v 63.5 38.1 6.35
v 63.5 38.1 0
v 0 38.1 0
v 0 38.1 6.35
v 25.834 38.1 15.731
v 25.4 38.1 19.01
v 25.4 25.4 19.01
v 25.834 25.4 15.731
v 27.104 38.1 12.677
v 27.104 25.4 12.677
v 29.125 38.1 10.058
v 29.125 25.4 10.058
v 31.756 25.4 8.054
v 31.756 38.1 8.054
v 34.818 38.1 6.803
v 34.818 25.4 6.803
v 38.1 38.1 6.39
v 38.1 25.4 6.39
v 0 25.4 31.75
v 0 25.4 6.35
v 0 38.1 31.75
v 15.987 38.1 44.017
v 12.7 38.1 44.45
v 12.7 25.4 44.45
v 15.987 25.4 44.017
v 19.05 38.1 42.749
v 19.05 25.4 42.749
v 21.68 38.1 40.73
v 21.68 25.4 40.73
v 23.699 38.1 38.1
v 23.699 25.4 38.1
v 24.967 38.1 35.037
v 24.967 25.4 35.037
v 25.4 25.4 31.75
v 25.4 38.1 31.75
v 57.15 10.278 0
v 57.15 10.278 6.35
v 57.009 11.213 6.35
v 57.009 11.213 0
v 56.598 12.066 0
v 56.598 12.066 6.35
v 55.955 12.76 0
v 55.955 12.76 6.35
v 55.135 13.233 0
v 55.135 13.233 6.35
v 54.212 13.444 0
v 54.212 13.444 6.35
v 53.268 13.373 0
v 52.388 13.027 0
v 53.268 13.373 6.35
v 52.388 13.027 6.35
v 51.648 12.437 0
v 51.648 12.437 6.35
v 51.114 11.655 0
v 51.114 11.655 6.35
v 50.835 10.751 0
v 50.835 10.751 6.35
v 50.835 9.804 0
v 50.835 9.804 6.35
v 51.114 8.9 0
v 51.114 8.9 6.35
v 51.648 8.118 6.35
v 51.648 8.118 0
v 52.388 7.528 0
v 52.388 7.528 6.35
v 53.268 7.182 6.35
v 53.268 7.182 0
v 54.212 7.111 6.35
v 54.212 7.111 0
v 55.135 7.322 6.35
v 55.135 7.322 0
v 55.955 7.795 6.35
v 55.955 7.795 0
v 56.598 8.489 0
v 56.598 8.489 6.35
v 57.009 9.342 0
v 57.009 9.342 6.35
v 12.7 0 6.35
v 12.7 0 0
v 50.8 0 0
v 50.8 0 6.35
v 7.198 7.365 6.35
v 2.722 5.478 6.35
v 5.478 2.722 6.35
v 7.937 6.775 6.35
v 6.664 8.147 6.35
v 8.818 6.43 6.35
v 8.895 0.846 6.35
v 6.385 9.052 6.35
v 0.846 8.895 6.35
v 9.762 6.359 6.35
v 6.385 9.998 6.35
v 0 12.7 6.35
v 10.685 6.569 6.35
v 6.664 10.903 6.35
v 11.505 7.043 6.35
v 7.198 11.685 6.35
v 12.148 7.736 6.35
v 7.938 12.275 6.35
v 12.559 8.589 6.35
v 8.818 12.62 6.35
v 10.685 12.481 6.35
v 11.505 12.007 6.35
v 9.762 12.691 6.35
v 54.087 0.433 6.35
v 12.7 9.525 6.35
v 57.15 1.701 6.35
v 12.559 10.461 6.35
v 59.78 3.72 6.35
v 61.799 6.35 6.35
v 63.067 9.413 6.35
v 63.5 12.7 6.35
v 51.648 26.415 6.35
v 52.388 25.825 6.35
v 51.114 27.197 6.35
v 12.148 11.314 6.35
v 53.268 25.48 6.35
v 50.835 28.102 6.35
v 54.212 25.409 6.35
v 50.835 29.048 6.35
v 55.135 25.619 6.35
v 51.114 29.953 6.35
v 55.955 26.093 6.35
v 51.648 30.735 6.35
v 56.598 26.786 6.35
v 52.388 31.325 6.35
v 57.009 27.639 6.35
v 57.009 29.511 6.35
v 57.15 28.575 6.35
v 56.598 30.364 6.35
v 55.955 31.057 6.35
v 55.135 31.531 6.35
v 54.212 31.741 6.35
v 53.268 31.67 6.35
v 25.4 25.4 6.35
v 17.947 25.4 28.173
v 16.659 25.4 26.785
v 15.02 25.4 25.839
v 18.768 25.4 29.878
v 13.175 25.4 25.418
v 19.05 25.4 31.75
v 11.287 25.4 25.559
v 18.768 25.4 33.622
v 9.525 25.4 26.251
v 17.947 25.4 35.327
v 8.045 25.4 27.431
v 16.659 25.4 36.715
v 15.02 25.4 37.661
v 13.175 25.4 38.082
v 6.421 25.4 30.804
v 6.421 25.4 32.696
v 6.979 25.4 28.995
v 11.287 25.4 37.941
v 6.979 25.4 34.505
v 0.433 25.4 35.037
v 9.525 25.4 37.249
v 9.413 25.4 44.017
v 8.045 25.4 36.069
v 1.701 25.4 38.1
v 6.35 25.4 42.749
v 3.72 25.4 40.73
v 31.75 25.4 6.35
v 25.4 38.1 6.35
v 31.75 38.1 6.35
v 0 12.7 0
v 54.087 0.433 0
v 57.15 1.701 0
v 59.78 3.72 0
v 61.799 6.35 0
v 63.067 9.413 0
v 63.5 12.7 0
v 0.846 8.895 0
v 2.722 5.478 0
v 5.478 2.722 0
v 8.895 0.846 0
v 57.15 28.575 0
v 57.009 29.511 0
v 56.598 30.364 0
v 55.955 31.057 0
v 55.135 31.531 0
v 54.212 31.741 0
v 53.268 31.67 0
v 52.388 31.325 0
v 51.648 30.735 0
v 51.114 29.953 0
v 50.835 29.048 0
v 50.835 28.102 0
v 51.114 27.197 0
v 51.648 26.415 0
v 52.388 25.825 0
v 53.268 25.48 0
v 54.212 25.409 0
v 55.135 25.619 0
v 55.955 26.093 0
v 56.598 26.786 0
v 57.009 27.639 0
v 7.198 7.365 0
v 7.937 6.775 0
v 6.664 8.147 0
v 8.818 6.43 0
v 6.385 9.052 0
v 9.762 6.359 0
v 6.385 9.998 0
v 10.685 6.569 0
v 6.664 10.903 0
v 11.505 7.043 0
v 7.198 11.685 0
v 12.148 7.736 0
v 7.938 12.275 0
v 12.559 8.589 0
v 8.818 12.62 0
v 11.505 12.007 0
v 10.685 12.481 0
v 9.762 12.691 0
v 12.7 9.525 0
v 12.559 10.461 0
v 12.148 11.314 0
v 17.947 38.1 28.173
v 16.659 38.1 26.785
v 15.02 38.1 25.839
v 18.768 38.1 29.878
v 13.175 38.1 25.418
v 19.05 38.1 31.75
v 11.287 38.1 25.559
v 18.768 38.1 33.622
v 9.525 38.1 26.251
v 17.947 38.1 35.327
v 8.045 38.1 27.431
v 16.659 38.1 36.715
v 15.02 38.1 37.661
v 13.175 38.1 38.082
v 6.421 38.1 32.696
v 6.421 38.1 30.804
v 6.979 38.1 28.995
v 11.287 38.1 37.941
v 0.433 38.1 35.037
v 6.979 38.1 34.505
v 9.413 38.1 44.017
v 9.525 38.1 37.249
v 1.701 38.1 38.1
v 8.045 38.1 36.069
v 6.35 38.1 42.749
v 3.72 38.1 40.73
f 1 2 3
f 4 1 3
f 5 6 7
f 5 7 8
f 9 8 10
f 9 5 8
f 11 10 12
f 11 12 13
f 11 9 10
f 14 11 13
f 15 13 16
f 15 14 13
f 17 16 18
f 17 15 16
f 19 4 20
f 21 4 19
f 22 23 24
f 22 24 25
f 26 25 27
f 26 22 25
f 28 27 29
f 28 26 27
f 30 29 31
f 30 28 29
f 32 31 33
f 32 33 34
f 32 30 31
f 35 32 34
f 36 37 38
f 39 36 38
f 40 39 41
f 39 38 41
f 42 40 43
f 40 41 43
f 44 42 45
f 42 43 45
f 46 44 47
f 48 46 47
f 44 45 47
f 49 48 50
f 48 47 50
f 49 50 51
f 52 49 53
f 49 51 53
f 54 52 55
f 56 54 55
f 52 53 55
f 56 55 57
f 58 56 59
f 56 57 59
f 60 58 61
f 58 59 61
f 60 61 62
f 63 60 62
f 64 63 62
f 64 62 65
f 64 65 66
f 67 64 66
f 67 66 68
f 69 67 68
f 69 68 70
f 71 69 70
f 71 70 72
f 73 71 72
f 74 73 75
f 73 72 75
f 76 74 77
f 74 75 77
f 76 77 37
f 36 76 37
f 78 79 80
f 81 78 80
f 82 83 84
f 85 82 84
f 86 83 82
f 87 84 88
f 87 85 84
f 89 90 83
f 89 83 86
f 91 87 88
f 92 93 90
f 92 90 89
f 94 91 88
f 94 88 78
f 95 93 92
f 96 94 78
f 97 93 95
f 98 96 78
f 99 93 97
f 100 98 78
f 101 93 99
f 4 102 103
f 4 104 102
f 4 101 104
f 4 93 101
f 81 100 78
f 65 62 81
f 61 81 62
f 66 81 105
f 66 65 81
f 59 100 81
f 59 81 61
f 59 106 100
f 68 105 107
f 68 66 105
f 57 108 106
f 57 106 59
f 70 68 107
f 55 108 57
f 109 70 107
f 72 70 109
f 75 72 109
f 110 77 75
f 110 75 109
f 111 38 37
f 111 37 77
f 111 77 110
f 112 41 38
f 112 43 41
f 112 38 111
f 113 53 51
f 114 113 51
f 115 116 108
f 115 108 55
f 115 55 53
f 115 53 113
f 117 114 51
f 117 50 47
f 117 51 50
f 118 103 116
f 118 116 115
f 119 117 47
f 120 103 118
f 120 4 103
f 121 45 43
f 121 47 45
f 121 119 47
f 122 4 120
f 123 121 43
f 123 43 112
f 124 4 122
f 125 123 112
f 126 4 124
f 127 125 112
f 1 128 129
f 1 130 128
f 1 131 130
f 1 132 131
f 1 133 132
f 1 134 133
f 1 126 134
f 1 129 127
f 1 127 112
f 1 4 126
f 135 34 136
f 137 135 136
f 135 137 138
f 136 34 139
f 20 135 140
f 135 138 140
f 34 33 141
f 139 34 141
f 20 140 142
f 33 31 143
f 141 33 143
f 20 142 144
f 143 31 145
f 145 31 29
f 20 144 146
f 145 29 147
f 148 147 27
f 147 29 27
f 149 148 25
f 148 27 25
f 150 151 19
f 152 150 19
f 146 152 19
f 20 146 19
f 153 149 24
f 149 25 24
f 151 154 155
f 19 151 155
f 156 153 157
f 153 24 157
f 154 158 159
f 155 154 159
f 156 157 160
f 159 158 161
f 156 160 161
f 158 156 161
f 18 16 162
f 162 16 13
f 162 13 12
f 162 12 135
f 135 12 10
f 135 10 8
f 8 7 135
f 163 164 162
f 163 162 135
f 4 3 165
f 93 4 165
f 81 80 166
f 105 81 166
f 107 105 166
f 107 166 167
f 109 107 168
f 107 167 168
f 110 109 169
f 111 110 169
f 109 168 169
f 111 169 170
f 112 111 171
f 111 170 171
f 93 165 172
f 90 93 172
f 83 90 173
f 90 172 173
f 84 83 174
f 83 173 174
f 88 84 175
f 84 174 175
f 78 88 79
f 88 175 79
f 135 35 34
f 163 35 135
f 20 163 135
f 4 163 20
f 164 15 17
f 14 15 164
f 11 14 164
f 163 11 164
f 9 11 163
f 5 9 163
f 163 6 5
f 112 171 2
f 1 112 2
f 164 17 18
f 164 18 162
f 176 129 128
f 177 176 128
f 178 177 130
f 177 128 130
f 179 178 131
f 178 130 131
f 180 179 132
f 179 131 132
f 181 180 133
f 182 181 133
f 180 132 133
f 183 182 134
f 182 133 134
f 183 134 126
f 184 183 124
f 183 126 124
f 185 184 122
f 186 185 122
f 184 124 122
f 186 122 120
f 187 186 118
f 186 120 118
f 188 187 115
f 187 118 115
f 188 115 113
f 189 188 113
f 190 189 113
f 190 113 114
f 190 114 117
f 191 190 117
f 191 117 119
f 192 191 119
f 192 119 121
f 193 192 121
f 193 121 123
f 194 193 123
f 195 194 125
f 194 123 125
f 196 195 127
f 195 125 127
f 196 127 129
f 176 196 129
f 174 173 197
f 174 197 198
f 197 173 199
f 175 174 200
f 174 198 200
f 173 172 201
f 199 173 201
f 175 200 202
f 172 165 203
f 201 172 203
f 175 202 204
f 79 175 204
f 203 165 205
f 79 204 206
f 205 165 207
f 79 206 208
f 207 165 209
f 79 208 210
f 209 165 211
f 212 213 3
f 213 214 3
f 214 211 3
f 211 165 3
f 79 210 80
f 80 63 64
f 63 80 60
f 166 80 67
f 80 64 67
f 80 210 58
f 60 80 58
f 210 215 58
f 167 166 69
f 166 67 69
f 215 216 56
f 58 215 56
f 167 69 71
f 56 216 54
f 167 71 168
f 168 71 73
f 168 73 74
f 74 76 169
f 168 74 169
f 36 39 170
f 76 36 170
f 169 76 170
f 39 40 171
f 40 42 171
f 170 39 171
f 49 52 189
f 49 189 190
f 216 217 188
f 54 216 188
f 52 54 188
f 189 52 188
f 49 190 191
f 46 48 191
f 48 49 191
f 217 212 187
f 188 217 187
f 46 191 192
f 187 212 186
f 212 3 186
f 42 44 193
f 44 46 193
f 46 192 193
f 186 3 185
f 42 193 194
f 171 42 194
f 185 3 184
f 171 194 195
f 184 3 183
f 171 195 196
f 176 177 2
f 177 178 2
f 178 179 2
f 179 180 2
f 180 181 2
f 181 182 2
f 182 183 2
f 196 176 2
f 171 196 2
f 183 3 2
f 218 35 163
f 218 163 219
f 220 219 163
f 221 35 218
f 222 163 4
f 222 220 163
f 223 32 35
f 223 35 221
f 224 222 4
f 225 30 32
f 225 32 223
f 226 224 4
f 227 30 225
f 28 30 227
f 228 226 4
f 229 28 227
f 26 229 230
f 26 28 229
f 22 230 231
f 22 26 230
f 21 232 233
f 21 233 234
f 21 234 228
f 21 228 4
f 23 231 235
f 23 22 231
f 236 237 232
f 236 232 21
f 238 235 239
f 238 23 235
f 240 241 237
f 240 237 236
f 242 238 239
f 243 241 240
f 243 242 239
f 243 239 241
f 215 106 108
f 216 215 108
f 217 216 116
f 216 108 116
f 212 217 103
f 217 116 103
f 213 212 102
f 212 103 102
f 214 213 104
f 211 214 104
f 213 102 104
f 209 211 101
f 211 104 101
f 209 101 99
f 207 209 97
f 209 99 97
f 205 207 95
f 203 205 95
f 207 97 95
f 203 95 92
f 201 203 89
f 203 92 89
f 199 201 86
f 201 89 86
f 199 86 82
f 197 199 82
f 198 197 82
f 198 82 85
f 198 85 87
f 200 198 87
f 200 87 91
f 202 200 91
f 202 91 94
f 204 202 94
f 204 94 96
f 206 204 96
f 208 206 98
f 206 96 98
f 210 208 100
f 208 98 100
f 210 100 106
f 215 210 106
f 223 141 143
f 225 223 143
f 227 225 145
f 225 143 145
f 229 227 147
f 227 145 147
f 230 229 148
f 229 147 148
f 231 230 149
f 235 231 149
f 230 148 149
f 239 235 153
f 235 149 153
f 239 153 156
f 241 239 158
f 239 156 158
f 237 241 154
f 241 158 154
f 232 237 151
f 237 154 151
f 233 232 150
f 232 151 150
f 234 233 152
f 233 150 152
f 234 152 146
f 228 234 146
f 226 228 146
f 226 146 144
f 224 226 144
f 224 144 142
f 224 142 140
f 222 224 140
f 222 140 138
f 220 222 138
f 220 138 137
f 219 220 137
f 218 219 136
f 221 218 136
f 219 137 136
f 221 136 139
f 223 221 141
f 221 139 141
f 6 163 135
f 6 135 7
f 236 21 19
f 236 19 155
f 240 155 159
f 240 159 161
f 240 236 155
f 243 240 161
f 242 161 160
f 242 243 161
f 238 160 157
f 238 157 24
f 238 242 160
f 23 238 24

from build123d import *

# Parameters (mm, degrees)
F1_DEPTH = 6.35
F2_R     = 3.175
F3_DEPTH = 6.35
F6_DEPTH = 12.7
F7_R     = 6.35
F8_DEPTH = 12.7


with BuildPart() as f1:
    # F0 (on Top) → F1 (new body)
    with BuildSketch(Plane.XY):
        with BuildLine():
            Line((63.5, 38.1), (0, 38.1))
            Line((0, 38.1), (0, 12.7))
            ThreePointArc((0, 12.7), (4.0025969694, 4.0025969694), (12.7, 0))
            Line((12.7, 0), (50.8, 0))
            ThreePointArc((50.8, 0), (59.7802561211, 3.7197438789), (63.5, 12.7))
            Line((63.5, 12.7), (63.5, 38.1))
        make_face()
    extrude(amount=F1_DEPTH)

    # F2 (on face) → F3 (cut)
    with BuildSketch(Plane.XY.offset(6.35)):
        with Locations((9.525, 9.525)):
            Circle(F2_R)
        with Locations((53.975, 10.2775470457)):
            Circle(F2_R)
        with Locations((53.975, 28.575)):
            Circle(F2_R)
    extrude(amount=-F3_DEPTH, mode=Mode.SUBTRACT)


with BuildPart() as f6:
    # F5 (on face) → F6 (new body)
    with BuildSketch(Plane(origin=(0, 38.1, 0), x_dir=(-1, 0, 0), z_dir=(0, 1, 0))):
        with BuildLine():
            Line((-31.7500000001, 6.35), (-25.4, 6.35))
            Line((-25.4, 6.35), (-25.4, 19.0102830149))
            ThreePointArc((-25.4, 19.0102830149), (-29.1246641911, 10.058140301), (-38.1, 6.3897169851))
            Line((-38.1, 6.3897169851), (-31.7500000001, 6.35))
        make_face()
    extrude(amount=-F6_DEPTH)


with BuildPart() as f6b:
    # F4 (on face) → F6, piece 2 (new body)
    with BuildSketch(Plane(origin=(0, 38.1, 0), x_dir=(-1, 0, 0), z_dir=(0, 1, 0))):
        with BuildLine():
            Line((-25.4, 6.35), (0, 6.35))
            Line((0, 6.35), (0, 31.75))
            ThreePointArc((0, 31.75), (-3.7197438789, 40.7302561211), (-12.7, 44.45))
            ThreePointArc((-12.7, 44.45), (-21.6802561211, 40.7302561211), (-25.4, 31.75))
            Line((-25.4, 31.75), (-25.4, 6.35))
        make_face()
    extrude(amount=-F6_DEPTH)

    # F7 (on face) → F8 (cut)
    with BuildSketch(Plane.XZ.offset(-25.4)):
        with Locations((12.7, 31.75)):
            Circle(F7_R)
    extrude(amount=-F8_DEPTH, mode=Mode.SUBTRACT)


solid = Compound([f1.part, f6.part, f6b.part])
